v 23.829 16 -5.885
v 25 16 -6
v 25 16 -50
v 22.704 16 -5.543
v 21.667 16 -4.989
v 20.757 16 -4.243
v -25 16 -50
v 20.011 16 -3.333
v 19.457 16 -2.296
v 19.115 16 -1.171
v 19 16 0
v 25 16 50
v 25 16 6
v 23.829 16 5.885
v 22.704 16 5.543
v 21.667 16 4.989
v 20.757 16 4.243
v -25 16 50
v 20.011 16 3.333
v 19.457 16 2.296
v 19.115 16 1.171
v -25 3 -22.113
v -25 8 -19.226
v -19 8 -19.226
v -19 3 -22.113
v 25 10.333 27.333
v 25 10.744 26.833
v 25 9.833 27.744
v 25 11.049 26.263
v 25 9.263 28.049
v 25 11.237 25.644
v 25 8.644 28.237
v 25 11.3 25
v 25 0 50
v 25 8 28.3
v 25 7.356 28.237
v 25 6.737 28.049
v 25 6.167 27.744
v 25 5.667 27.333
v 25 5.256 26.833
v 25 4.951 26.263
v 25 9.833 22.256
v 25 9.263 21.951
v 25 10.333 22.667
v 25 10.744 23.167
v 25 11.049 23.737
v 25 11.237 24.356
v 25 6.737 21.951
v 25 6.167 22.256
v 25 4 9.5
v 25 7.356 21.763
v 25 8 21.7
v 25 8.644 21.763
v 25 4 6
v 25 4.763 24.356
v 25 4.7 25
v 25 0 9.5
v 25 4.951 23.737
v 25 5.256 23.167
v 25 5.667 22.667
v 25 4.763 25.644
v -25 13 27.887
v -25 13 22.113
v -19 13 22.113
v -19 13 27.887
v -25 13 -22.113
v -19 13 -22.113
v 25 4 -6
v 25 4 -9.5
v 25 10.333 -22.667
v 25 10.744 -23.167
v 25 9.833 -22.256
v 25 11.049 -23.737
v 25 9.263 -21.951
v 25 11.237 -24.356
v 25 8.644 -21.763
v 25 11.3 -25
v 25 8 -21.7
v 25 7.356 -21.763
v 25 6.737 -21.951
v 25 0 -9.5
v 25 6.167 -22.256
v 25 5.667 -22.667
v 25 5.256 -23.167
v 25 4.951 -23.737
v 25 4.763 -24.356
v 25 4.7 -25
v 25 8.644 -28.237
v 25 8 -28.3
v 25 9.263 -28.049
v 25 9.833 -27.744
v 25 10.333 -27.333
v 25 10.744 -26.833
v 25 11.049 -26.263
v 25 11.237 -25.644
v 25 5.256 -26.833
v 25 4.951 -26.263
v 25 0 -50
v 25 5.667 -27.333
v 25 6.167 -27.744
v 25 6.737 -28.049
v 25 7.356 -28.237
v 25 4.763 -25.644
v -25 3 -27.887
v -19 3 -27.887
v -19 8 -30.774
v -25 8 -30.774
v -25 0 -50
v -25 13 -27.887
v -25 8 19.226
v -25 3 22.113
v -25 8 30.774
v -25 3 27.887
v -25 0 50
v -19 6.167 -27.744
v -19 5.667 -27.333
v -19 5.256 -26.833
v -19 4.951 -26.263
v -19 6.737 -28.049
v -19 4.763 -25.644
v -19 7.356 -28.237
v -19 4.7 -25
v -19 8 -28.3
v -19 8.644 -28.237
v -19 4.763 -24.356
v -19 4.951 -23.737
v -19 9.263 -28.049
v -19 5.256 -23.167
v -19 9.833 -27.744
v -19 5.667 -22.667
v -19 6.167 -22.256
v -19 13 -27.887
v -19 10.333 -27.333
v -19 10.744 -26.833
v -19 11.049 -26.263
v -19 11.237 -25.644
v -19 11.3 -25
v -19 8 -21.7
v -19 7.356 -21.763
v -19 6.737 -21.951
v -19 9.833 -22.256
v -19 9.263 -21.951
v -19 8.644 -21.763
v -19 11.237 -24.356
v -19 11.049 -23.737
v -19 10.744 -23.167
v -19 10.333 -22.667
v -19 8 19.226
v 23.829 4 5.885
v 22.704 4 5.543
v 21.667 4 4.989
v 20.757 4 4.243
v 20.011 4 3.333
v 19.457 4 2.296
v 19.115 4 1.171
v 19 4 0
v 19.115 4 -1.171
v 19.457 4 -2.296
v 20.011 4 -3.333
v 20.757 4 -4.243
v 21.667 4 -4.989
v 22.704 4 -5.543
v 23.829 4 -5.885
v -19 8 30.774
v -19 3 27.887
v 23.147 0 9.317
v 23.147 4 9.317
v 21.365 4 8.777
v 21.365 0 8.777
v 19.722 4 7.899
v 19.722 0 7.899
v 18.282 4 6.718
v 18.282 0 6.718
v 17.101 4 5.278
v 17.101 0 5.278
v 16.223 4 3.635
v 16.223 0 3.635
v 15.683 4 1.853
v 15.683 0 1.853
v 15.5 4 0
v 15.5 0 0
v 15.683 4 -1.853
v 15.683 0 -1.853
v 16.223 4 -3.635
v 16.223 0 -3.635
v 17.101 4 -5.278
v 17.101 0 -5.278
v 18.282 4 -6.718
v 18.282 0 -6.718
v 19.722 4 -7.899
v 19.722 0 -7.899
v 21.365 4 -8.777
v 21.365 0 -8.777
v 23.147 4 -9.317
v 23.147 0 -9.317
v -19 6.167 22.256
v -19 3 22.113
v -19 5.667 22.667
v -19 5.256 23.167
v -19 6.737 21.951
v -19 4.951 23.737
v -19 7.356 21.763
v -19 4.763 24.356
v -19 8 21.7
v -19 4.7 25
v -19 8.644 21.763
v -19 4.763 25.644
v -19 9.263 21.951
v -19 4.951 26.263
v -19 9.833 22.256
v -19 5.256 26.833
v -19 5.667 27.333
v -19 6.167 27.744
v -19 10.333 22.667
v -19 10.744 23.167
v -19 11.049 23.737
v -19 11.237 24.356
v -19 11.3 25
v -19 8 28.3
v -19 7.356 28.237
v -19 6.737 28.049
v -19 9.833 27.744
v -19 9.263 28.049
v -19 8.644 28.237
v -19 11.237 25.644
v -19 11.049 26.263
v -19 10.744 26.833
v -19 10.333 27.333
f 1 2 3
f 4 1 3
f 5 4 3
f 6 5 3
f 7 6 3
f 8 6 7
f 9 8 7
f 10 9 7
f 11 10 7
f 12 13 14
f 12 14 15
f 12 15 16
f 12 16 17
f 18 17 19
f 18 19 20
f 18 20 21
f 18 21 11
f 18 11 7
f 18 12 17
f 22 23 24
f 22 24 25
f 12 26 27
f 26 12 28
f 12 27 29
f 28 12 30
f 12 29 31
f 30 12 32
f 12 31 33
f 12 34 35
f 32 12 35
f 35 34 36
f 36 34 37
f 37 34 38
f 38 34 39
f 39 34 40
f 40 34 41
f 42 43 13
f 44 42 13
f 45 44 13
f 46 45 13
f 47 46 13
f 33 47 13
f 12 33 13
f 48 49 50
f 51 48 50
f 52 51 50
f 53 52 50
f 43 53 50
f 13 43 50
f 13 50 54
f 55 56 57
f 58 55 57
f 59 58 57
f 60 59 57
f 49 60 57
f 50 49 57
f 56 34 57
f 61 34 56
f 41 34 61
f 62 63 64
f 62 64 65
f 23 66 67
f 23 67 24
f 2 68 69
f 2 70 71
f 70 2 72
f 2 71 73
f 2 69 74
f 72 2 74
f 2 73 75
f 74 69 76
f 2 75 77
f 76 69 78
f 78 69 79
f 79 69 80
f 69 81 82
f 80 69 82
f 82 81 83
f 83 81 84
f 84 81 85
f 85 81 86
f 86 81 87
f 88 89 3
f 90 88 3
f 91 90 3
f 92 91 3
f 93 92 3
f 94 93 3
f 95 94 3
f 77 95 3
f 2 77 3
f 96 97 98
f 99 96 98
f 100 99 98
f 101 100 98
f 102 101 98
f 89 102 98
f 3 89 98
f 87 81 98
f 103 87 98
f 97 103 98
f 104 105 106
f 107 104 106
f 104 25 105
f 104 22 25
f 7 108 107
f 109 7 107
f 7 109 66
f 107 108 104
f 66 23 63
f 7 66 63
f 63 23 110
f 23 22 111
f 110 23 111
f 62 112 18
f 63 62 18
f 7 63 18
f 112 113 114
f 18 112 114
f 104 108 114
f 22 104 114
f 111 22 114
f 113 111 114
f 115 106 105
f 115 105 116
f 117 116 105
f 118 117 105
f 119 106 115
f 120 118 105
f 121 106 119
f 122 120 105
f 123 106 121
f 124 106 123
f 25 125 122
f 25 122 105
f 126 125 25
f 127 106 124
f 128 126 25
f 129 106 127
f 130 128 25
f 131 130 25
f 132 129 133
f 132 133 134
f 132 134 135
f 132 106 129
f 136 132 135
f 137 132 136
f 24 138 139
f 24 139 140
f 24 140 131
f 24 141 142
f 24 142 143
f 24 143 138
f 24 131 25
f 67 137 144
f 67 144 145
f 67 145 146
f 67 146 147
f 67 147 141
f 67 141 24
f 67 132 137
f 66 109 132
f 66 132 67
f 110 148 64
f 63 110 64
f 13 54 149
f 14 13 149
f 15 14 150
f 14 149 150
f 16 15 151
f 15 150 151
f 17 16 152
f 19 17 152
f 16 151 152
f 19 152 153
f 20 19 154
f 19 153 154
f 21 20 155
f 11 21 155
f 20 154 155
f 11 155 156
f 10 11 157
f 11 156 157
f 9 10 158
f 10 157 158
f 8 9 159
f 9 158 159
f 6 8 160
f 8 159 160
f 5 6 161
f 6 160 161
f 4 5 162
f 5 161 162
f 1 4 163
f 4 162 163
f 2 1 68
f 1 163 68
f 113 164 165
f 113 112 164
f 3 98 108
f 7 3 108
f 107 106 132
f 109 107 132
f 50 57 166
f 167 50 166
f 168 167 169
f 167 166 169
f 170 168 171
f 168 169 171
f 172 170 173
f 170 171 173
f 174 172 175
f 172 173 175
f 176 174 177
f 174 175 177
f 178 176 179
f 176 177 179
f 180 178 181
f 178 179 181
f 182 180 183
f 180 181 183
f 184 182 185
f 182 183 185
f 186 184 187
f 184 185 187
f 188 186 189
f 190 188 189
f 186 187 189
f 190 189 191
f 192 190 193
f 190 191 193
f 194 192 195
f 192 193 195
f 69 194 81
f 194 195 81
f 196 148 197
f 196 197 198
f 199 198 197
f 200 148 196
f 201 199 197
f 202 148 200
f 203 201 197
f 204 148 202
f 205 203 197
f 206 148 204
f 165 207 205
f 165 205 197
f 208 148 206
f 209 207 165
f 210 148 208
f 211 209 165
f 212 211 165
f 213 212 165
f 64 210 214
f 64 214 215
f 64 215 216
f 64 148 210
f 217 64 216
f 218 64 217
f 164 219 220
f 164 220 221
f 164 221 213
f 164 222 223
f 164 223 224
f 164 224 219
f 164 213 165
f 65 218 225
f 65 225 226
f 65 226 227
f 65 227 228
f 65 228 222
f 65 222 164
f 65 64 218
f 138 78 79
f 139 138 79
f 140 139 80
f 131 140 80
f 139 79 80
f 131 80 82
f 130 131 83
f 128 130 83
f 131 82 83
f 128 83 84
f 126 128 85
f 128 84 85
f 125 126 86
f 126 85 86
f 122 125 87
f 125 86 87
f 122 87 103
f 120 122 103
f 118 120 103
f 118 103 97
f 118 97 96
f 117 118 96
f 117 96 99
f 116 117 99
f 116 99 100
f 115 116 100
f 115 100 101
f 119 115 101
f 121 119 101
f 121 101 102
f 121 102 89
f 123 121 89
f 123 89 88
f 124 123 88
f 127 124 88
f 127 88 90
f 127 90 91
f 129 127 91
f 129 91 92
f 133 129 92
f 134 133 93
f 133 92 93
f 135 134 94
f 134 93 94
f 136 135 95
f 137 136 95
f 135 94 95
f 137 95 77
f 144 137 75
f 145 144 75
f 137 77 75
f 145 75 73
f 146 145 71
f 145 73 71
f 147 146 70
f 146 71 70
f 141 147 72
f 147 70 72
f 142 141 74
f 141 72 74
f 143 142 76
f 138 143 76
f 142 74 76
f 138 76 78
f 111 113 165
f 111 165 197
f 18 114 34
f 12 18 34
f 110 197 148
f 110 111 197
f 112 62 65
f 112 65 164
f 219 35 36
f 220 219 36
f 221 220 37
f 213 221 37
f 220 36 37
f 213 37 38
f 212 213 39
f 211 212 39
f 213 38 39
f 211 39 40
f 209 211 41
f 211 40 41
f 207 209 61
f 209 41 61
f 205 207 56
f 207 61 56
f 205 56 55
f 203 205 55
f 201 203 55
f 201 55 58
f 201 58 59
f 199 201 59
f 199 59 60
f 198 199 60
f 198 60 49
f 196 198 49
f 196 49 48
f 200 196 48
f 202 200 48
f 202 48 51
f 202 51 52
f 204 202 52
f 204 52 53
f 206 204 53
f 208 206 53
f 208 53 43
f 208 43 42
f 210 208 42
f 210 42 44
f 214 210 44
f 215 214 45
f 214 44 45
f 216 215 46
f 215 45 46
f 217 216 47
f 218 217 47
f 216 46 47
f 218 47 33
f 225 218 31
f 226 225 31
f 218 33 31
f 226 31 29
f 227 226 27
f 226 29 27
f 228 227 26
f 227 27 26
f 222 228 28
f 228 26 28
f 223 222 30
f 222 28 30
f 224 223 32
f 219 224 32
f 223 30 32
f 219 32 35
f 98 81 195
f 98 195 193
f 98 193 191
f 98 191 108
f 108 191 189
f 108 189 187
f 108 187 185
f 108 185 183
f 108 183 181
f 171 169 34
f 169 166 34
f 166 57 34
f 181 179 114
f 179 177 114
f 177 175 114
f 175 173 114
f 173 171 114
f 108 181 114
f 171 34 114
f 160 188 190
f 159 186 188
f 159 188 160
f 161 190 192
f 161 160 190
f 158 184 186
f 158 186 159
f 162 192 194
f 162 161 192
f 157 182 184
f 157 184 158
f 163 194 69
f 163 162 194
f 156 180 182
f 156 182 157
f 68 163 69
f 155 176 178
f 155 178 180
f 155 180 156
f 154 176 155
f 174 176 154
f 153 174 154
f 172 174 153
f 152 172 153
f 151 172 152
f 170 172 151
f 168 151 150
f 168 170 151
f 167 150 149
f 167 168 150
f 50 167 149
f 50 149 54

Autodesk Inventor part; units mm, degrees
ref_plane "YZ Plane" through (0, 0, 0) normal (1, 0, 0) x (0, 1, 0)
ref_plane "XZ Plane" through (0, 0, 0) normal (0, 1, 0) x (-1, 0, 0)
ref_plane "XY Plane" through (0, 0, 0) normal (0, 0, 1) x (1, 0, 0)
sketch "Schizzo1" plane through (0, 0, 0) normal (0, 1, 0) x (-1, 0, 0)
  line L0 (25, 50) -> (-25, 50)
  line L1 (-25, 50) -> (-25, -50)
  line L2 (-25, -50) -> (25, -50)
  line L3 (25, -50) -> (25, 50)
  line L4 (25, 50) -> (-25, -50) construction
  line L5 (-25, 50) -> (25, -50) construction
  point P0 (0, 0)
  point P1 (0, 0)
  point P2 (0, 0)
  dimension "d0" = 50
  dimension "d9" = 100
extrude "Estrusione1" add sketch "Schizzo1" along normal blind 16
sketch "Schizzo2" plane through (0, 0, 0) normal (0, -1, 0) x (1, 0, 0)
  circle A0 centre (25, 0) radius 9.5
  line L0 (25, 50) -> (25, -50) projected
  point P0 (0, 0)
  dimension "d3" = 19
extrude "Estrusione2" cut sketch "Schizzo2" against normal blind 4
sketch "Schizzo4" plane through (0, 4, 0) normal (0, -1, 0) x (1, 0, 0)
  circle A0 centre (25, 0) radius 6
  line L0 (25, 9.5) -> (25, -9.5) projected
  point P0 (0, 0)
  point P1 (25, 6)
  point P2 (25, -6)
  dimension "d6" = 12
extrude "Estrusione3" cut sketch "Schizzo4" against normal blind 26 contours L0 A0 picked at (23.13, -0.7092)
sketch "Schizzo5" plane through (-25, 0, -50) normal (-1, 0, 0) x (0, 0, 1)
  line L0 (50, 0) -> (50, 8)
  line L1 (50, 8) -> (75, 8)
  line L2 (50, 8) -> (25, 8)
  line L3 (50, 8) -> (75, 8) construction
  dimension "d10" = 8
  dimension "d11" = 25
  dimension "d12" = 25
  dimension "d13" = 180
hole "Foro1" at (-25, 8, -25) at (-25, 8, 25) direction (1, 0, 0) diameter 6.6 end through all clearance for "Bullone a testa esagonale" size "M6" standard "ANSI - Profilo M Metrico"
sketch "Schizzo6" plane through (-25, 0, -50) normal (-1, 0, 0) x (0, 0, 1)
  circle A0 centre (25, 8) radius 3.3 projected
  circle A1 centre (25, 8) radius 5
  circle A2 centre (75, 8) radius 3.3 projected
  circle A3 centre (75, 8) radius 5
  circle A4 centre (25, 8) radius 3.3 projected
  line L0 (27.8868, 13) -> (30.7735, 8)
  line L1 (30.7735, 8) -> (27.8868, 3)
  line L2 (27.8868, 3) -> (22.1132, 3)
  line L3 (22.1132, 3) -> (19.2265, 8)
  line L4 (19.2265, 8) -> (22.1132, 13)
  line L5 (22.1132, 13) -> (27.8868, 13)
  line L6 (77.8868, 13) -> (80.7735, 8)
  line L7 (80.7735, 8) -> (77.8868, 3)
  line L8 (77.8868, 3) -> (72.1132, 3)
  line L9 (72.1132, 3) -> (69.2265, 8)
  line L10 (69.2265, 8) -> (72.1132, 13)
  line L11 (72.1132, 13) -> (77.8868, 13)
  point P0 (50, 0)
  point P1 (25, 13)
  point P2 (75, 13)
  dimension "d21" = 10
  dimension "d22" = 10
extrude "Estrusione4" cut sketch "Schizzo6" against normal blind 6 contours A0 | A1 | A1 L0 L1 | A1 L5 L0 | L1 L2 A1 | A1 L4 L5 | L2 L3 A1 | A1 L3 L4 | A2 | A3 | A3 L6 L7 | A3 L11 L6 | L7 L8 A3 | A3 L10 L11 | L8 L9 A3 | A3 L9 L10
properties part number "15_Base_Dietro"
